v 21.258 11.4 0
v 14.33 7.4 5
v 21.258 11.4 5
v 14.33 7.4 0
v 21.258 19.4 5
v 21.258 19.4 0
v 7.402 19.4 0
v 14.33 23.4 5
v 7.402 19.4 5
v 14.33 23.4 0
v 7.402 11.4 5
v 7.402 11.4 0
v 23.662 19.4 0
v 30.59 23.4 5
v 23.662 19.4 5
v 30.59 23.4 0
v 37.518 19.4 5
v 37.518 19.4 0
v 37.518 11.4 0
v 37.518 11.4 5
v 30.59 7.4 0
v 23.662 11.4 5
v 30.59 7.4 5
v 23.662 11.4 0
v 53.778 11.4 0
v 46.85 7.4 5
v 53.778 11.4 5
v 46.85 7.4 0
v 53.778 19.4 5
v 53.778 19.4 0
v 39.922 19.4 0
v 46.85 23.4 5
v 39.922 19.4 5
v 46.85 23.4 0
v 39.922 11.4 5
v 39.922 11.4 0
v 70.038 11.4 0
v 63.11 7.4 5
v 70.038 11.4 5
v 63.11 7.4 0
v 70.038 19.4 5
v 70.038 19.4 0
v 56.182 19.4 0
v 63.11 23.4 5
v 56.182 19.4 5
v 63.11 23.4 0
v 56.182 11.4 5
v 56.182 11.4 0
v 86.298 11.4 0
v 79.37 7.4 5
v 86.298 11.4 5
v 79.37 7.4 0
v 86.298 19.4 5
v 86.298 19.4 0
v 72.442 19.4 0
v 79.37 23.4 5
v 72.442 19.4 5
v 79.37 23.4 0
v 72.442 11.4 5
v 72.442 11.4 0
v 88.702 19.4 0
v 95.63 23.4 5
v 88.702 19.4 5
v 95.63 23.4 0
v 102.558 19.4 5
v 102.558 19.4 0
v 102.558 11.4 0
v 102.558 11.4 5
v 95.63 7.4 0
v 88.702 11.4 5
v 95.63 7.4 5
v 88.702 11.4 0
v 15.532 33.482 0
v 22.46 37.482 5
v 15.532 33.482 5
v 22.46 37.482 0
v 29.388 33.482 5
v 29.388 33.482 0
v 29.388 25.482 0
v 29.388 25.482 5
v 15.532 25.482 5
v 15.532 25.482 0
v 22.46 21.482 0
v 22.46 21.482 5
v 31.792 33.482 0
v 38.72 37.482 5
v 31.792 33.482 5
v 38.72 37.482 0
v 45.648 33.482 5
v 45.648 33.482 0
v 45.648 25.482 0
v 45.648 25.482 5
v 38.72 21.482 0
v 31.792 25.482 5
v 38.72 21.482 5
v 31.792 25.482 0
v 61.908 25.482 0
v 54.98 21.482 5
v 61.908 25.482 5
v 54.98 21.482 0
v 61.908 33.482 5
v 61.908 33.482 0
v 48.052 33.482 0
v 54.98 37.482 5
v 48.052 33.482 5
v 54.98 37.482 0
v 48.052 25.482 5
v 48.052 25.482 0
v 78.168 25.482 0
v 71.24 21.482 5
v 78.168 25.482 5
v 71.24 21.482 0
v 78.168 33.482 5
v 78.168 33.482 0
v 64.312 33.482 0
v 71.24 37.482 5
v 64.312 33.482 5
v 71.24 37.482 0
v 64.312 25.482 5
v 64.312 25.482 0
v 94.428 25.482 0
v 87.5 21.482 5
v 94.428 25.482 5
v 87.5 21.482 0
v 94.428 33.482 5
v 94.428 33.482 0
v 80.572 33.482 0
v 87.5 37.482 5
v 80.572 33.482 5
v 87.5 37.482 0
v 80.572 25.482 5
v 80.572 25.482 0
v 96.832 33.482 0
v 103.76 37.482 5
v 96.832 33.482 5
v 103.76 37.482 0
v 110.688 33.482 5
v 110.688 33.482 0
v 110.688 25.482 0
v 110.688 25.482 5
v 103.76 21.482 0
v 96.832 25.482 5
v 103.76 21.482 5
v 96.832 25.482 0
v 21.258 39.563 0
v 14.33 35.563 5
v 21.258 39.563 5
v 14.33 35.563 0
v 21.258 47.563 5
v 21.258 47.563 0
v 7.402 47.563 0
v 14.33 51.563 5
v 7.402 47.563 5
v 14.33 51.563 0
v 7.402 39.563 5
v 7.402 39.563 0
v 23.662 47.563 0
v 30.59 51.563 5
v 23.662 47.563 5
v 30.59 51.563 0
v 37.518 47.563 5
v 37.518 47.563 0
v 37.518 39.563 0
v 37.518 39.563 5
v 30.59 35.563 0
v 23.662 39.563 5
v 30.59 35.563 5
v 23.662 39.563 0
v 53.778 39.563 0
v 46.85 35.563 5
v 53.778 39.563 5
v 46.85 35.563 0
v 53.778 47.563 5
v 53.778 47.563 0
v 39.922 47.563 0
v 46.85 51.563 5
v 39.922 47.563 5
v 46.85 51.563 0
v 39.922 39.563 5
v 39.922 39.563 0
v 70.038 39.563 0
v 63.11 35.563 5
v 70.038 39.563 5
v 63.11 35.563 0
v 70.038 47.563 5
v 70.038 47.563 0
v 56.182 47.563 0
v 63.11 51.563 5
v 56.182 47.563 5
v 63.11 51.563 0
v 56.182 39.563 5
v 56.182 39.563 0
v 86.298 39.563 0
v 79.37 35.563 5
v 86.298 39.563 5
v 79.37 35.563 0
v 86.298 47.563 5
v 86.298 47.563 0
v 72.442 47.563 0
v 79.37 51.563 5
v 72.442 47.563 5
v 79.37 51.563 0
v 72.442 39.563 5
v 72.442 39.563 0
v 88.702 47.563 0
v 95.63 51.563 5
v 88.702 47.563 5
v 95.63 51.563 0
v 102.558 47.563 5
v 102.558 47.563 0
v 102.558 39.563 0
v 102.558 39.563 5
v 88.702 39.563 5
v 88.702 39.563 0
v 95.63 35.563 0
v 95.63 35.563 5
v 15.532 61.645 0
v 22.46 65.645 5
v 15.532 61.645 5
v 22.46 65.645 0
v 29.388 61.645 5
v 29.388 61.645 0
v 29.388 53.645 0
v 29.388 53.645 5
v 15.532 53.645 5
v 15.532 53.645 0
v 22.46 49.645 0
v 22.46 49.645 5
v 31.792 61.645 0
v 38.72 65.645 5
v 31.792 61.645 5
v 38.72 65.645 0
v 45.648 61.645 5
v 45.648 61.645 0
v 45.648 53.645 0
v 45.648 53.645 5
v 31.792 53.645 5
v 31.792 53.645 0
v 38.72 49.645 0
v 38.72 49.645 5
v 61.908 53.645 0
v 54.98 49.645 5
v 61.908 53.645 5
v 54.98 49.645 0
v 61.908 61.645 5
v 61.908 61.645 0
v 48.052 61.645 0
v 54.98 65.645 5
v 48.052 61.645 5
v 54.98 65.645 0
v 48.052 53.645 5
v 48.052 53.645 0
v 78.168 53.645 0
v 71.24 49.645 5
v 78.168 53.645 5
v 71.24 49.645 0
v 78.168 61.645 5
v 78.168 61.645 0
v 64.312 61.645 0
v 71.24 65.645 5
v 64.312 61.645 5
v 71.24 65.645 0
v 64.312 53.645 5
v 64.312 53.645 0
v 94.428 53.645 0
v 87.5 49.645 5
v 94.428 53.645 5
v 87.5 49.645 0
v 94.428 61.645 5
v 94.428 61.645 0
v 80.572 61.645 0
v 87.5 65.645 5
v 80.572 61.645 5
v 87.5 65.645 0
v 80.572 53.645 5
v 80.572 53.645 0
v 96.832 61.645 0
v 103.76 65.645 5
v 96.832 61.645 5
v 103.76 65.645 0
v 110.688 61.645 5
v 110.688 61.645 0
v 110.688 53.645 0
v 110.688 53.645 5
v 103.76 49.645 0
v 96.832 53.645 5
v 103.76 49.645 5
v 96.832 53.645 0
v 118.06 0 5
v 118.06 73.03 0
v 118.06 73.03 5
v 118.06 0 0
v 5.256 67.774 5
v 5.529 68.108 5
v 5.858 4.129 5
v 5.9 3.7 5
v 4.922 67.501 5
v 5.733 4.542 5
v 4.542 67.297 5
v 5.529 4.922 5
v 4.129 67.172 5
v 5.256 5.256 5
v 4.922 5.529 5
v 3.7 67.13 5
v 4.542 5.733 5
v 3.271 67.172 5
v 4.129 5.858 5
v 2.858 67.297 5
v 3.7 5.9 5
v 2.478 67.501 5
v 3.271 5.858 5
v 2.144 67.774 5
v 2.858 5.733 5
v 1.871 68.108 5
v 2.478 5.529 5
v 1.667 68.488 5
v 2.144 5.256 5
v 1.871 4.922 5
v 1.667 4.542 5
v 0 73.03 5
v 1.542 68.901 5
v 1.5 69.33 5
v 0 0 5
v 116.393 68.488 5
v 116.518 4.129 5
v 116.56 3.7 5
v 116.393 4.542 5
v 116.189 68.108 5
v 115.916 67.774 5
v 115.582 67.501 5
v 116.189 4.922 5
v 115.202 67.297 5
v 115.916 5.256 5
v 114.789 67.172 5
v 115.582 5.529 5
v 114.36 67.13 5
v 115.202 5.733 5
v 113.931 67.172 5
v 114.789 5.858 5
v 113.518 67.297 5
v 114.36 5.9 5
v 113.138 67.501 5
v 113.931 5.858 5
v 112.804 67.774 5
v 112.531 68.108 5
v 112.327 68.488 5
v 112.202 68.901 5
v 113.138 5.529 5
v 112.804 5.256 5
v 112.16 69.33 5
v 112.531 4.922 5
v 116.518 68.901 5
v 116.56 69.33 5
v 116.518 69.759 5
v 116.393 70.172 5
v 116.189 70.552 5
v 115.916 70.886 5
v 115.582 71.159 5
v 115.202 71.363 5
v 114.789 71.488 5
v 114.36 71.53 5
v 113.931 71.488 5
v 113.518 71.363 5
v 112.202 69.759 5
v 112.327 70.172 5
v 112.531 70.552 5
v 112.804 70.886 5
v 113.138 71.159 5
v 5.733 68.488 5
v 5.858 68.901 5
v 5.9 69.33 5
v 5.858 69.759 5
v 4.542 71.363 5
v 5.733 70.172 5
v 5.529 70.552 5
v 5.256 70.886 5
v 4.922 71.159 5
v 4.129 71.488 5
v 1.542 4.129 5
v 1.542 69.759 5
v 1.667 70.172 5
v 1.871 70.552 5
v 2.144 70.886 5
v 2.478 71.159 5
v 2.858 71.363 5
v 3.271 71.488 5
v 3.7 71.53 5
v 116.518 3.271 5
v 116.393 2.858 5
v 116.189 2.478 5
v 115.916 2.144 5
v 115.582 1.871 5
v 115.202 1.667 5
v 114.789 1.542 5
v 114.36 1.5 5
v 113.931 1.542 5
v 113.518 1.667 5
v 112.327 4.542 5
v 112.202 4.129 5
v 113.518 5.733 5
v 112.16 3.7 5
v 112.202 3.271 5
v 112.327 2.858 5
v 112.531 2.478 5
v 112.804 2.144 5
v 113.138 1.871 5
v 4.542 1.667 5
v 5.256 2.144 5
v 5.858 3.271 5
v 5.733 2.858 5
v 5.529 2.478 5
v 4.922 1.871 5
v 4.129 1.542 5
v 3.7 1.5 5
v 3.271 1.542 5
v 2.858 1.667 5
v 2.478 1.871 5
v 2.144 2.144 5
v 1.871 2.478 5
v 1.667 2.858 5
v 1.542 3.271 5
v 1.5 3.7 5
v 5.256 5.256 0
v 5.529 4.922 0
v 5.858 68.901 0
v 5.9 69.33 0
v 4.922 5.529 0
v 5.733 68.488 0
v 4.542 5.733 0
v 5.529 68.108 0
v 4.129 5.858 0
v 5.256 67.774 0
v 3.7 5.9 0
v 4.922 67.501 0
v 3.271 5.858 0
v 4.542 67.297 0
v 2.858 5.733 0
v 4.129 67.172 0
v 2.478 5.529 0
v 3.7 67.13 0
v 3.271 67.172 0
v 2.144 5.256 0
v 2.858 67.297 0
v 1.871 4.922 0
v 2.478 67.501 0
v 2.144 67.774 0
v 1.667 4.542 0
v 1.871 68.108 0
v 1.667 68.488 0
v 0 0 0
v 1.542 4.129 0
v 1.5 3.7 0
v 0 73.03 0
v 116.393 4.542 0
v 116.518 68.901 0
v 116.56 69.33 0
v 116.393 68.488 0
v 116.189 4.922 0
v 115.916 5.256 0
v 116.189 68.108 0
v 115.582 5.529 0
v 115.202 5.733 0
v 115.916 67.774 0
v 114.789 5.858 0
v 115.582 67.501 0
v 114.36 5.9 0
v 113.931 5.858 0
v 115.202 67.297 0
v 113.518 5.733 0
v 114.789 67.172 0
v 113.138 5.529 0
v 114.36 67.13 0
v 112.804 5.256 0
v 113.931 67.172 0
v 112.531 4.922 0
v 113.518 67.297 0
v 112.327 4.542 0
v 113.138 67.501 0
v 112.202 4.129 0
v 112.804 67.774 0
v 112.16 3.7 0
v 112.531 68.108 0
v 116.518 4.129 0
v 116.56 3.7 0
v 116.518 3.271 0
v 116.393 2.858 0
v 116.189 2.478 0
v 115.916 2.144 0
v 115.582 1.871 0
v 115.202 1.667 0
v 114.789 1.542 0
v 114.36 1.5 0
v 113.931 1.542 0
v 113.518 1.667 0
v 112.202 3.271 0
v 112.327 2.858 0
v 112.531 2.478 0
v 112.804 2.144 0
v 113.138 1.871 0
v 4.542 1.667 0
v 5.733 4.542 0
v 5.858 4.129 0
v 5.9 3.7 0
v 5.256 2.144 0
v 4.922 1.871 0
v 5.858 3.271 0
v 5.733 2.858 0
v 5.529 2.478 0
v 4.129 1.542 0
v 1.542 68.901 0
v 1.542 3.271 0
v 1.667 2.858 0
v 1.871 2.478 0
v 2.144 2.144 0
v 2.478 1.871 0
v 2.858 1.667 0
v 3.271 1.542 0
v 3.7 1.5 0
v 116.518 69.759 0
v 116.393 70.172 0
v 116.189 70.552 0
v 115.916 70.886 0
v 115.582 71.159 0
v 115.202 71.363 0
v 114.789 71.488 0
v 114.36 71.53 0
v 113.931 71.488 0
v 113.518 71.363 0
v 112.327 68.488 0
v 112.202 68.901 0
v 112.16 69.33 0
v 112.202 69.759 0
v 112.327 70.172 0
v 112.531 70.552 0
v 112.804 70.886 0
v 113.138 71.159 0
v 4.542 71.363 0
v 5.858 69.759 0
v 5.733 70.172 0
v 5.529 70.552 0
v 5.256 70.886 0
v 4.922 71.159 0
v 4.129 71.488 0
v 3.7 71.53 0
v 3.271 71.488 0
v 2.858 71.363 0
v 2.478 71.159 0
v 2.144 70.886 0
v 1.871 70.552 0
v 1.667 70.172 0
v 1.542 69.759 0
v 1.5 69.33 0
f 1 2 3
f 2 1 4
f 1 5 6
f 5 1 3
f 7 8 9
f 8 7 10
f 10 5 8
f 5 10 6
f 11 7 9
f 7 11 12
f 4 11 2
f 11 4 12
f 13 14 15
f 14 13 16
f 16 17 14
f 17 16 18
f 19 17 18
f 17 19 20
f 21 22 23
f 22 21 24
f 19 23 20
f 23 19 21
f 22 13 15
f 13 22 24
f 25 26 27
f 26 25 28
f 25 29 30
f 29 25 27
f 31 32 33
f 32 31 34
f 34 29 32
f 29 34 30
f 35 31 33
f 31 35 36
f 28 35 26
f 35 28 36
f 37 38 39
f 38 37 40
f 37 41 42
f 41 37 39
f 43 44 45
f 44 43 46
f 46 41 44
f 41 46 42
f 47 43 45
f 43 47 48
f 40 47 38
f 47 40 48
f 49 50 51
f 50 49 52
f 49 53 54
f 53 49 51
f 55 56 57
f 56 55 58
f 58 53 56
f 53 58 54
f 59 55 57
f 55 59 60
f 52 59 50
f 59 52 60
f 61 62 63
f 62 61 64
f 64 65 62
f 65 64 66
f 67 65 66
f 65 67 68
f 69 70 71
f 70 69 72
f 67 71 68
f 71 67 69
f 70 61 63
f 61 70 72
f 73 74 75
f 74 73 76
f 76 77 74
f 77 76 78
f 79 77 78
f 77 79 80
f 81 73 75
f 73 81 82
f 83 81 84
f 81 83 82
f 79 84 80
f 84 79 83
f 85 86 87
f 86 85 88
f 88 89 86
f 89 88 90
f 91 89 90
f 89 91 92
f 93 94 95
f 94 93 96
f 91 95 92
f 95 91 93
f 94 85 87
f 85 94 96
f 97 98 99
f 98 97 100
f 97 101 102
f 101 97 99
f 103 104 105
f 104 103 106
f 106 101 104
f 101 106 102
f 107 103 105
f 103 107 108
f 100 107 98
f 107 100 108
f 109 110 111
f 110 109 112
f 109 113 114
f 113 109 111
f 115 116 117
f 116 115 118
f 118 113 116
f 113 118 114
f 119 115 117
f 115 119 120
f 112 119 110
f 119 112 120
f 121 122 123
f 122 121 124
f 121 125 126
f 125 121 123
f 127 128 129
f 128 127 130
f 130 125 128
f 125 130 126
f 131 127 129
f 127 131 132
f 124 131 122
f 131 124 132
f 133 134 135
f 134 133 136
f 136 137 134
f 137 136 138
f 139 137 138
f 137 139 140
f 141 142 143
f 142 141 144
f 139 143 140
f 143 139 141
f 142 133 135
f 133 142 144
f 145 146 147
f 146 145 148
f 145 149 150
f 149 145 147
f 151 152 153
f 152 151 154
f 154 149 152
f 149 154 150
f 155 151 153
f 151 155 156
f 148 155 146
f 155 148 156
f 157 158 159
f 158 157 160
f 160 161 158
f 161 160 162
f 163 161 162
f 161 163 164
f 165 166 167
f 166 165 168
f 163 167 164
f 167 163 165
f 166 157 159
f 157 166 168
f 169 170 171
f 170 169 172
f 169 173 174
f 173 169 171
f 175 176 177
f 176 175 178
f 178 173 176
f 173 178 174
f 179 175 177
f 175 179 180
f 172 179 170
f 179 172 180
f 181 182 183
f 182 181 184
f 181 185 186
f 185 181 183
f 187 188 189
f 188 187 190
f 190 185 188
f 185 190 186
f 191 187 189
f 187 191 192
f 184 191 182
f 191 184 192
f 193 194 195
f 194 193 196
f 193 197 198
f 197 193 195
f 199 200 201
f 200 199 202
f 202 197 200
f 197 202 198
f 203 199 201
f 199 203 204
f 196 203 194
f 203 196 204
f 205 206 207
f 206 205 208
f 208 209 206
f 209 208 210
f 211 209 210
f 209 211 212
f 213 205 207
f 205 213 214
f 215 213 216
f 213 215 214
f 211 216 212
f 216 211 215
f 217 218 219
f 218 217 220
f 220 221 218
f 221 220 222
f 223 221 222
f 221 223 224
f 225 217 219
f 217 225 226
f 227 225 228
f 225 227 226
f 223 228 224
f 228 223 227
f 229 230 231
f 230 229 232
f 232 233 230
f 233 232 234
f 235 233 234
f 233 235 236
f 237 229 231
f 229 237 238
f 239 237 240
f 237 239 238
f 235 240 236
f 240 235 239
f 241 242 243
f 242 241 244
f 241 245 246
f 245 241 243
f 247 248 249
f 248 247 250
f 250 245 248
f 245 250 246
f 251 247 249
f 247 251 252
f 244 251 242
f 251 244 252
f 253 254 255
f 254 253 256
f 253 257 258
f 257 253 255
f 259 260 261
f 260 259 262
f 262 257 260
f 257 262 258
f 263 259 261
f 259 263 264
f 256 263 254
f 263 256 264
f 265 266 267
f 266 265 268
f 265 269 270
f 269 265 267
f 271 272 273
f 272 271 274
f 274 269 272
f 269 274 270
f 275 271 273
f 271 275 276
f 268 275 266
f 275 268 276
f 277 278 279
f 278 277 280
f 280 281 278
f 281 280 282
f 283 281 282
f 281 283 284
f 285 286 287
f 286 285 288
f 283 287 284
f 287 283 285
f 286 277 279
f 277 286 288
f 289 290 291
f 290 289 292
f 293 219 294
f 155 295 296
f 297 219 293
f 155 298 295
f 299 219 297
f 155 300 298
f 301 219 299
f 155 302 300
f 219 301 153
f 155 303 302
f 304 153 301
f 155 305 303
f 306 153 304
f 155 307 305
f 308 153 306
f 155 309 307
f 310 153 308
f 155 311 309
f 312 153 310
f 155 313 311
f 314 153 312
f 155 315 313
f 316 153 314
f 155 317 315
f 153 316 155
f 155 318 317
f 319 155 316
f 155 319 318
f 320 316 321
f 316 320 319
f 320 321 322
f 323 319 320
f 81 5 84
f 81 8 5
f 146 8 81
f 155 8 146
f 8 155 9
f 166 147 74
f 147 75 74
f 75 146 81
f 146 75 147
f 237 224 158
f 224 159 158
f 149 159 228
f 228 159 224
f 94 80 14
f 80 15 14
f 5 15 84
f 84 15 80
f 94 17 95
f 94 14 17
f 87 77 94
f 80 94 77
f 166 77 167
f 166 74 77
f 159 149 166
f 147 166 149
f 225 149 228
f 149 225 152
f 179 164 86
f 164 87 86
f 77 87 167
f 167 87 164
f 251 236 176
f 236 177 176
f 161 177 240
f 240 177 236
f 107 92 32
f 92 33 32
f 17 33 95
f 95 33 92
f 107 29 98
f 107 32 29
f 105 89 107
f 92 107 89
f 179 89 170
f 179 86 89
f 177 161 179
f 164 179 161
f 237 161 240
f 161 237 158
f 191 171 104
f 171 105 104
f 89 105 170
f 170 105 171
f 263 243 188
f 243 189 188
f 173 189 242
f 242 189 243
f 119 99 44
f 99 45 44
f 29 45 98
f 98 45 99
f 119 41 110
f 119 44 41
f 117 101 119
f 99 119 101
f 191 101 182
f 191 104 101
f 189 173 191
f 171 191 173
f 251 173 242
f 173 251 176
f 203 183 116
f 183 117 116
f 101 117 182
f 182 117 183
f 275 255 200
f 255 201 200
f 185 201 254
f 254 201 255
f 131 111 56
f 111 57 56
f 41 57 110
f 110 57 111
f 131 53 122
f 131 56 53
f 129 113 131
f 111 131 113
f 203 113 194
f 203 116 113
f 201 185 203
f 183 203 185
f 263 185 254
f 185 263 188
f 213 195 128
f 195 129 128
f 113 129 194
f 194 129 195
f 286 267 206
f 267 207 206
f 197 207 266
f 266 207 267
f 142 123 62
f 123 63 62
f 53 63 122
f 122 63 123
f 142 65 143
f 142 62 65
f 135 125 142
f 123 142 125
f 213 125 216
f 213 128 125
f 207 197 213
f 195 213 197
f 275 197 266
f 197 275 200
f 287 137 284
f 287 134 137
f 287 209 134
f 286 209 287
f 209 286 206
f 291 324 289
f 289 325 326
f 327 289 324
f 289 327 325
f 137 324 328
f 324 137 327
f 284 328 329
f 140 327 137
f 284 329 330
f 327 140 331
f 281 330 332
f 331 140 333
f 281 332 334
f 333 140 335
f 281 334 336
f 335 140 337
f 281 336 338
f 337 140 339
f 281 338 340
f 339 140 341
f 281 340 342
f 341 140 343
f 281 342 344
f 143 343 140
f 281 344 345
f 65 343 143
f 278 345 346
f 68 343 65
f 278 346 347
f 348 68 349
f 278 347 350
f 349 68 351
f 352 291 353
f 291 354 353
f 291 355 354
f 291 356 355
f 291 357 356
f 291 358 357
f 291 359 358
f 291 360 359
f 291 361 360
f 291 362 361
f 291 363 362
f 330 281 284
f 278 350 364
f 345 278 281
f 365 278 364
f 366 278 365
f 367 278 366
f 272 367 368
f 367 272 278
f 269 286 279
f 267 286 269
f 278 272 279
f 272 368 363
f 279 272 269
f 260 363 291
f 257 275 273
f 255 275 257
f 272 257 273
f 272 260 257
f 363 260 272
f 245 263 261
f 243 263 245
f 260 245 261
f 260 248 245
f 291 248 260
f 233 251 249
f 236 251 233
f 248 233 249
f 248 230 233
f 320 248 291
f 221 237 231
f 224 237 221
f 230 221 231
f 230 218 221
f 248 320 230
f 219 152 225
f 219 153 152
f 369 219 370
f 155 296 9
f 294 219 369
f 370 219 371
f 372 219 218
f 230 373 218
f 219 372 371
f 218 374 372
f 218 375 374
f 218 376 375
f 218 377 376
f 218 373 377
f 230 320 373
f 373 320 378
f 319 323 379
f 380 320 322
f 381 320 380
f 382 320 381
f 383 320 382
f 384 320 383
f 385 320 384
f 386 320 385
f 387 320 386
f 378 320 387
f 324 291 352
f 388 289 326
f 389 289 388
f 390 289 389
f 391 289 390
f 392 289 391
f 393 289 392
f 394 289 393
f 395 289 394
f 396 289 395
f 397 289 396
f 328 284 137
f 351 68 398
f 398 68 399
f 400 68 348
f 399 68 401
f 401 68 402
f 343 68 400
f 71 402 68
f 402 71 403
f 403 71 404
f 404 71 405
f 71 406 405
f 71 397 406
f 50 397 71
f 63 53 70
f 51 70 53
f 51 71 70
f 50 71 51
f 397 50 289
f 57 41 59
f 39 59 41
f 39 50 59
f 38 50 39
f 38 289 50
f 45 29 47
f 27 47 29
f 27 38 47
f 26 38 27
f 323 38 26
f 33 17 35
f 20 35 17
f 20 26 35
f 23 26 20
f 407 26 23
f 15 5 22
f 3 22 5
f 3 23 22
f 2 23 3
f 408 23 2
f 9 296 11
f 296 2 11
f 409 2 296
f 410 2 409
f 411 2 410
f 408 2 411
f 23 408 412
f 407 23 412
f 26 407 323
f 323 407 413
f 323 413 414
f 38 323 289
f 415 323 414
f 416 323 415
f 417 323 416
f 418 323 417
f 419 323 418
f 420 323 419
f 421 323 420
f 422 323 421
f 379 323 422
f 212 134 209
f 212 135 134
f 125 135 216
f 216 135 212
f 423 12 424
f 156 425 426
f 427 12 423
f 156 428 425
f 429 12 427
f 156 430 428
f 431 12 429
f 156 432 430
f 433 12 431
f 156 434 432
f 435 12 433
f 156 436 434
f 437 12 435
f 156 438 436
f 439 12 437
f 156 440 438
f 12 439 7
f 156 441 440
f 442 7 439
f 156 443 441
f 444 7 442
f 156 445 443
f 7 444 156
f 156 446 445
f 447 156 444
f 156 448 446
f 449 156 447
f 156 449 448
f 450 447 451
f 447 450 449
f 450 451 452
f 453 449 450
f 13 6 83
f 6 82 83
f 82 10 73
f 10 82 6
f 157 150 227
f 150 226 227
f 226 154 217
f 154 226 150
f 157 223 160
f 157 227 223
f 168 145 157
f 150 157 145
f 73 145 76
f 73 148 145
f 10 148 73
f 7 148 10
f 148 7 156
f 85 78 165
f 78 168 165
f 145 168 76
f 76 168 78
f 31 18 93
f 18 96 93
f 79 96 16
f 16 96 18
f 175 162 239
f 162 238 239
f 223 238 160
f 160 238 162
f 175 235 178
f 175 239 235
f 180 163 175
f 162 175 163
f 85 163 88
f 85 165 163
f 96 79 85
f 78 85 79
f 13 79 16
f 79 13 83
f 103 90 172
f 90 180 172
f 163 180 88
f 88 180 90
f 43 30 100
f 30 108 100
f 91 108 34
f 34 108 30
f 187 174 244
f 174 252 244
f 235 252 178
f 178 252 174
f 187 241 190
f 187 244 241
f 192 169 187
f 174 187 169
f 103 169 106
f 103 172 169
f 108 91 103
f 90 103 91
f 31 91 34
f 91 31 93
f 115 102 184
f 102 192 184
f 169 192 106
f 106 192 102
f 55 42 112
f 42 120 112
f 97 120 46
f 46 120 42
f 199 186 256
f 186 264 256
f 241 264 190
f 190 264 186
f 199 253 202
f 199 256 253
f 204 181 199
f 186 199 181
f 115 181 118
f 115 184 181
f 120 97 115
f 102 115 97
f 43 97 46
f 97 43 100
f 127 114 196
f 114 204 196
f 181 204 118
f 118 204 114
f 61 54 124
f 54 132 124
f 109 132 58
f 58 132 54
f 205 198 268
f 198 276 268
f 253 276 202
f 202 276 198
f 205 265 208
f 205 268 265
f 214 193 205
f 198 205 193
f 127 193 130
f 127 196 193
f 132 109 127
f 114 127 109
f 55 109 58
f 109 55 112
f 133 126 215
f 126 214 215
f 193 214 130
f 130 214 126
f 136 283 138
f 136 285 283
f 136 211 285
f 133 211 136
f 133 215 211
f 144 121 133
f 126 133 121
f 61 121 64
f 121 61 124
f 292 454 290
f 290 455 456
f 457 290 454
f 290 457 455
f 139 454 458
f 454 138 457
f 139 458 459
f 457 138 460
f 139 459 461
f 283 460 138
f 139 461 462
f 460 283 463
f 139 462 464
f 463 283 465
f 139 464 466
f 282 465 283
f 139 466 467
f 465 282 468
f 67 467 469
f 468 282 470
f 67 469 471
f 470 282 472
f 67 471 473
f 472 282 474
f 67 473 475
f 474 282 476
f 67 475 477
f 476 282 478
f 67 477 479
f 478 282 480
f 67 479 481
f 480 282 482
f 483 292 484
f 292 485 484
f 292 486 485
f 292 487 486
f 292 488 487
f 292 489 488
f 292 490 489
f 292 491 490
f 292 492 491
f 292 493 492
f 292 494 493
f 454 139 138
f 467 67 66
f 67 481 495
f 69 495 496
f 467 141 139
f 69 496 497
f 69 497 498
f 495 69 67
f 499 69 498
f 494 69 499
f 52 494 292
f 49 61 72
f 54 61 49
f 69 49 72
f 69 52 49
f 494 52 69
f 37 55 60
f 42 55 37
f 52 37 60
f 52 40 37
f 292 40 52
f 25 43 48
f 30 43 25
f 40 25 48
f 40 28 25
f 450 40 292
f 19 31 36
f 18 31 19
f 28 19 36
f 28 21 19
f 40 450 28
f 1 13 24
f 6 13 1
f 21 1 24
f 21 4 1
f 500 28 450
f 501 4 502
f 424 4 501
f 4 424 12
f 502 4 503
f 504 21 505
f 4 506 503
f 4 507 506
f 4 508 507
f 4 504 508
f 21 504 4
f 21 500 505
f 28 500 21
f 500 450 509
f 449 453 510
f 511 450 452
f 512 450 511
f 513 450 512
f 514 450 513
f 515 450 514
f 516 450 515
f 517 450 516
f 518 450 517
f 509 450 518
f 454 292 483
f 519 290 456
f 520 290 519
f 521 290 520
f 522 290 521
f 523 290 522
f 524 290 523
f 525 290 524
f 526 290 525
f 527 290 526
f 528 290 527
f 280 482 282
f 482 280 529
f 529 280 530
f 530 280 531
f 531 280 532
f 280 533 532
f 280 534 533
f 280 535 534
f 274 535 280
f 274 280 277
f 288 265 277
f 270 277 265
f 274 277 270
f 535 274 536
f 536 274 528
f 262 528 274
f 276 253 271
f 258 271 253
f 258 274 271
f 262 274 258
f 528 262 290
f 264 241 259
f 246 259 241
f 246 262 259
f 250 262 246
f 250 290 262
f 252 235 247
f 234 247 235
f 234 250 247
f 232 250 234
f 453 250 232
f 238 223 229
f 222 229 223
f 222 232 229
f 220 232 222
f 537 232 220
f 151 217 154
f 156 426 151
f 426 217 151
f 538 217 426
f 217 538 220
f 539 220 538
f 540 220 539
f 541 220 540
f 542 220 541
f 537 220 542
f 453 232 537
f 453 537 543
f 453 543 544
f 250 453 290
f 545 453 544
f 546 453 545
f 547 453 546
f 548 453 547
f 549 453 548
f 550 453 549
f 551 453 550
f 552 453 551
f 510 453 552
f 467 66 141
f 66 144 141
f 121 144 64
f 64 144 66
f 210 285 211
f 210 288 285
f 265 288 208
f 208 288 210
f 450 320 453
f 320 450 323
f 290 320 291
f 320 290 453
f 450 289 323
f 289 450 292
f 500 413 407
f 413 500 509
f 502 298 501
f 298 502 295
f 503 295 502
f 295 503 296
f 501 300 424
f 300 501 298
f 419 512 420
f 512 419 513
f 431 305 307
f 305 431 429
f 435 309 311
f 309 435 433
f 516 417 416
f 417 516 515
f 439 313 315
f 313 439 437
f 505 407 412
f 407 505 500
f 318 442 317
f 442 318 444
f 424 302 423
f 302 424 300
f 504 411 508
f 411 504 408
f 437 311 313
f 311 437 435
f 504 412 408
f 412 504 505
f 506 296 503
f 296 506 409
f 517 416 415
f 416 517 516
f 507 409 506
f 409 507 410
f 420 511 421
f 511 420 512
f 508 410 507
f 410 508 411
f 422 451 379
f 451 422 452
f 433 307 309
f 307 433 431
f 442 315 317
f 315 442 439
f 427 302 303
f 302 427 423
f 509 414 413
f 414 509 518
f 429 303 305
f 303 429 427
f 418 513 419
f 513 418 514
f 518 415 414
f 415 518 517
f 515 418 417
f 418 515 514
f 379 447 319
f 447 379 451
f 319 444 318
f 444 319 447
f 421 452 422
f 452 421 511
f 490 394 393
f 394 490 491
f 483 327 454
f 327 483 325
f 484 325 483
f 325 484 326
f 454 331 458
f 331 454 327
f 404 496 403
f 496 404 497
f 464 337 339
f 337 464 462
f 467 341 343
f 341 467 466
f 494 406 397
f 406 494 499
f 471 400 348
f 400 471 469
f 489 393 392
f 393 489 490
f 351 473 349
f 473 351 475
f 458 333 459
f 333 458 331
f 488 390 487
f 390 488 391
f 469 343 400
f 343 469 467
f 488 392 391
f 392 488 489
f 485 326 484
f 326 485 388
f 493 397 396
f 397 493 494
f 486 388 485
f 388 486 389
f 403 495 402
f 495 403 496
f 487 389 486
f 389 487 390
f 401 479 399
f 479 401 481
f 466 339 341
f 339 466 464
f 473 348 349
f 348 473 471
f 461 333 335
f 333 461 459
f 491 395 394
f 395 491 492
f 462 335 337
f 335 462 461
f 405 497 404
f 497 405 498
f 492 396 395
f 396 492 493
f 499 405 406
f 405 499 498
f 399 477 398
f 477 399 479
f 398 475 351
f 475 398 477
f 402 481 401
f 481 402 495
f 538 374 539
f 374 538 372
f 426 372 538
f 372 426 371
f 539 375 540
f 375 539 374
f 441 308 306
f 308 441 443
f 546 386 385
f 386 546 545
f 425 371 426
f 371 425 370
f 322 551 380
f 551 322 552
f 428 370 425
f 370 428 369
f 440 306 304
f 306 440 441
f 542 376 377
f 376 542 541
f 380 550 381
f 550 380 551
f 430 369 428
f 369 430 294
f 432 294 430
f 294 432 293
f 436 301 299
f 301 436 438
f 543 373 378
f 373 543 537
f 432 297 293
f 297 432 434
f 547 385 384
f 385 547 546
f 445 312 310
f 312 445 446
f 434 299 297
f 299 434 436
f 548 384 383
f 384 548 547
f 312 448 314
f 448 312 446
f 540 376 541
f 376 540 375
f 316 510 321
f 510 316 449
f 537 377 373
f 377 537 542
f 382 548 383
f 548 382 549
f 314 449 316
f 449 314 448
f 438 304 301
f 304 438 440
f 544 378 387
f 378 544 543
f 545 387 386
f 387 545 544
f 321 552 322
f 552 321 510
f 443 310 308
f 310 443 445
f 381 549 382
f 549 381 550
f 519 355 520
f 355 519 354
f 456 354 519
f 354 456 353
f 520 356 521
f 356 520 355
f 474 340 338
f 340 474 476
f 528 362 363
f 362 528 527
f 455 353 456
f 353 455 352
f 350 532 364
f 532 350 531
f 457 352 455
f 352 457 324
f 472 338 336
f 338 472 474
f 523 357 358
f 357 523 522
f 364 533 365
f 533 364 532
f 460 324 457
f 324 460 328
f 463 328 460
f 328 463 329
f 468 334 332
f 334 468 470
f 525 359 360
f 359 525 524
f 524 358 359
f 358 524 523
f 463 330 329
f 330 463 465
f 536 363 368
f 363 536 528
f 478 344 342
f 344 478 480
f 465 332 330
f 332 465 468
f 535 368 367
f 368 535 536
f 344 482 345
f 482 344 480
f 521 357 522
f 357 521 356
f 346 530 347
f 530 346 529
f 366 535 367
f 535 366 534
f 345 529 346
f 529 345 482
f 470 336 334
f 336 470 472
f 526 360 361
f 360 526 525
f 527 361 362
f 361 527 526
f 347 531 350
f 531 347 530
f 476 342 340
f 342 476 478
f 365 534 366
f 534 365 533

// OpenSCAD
$fn = 32;

// ----------------------------------------------------------------------
// Honeycomb panel: 118.06 x 73.03 mm, 24 cells of 16 mm
// ----------------------------------------------------------------------

// --- parameters (mm) ---
panel_w = 118.06;         // panel width
panel_d = 73.03;          // panel depth
thick = 5;                // panel thickness
cell_r = 8;               // hex cell circumradius
pitch = 16.26;            // hex cell pitch (centre to centre)
web = 2.4;                // web between the cells
columns = 6;              // columns of cells
rows = 4;                 // rows of cells
cell_count = 24;          // total cells
shift_x = 14.33;          // first cell offset in x
shift_y = 15.4;           // first cell offset in y
mount_d = 4.4;            // corner mounting holes
hole_off = 3.7;           // mounting hole offset from the corners

difference() {
  union() {
    cube([panel_w, panel_d, thick]);
  }
  /* hexagonal cells, point-up, cut right through the plate */
  for (row = [0 : rows - 1]) {
    for (col = [0 : columns - 1]) {
      translate([shift_x + col * pitch + (row % 2) * pitch / 2, shift_y + row * pitch * 0.866025, -2.5]) rotate([0, 0, 30]) cylinder(h = thick + 5, d = 2 * cell_r, $fn = 6);
    }
  }
  /* corner mounting holes, clear of the outer cell web */
  translate([3.7, 3.7, -2.5]) cylinder(h = thick + 5, d = mount_d);
  translate([114.36, 3.7, -2.5]) cylinder(h = thick + 5, d = mount_d);
  translate([3.7, 69.33, -2.5]) cylinder(h = thick + 5, d = mount_d);
  translate([114.36, 69.33, -2.5]) cylinder(h = thick + 5, d = mount_d);
}
